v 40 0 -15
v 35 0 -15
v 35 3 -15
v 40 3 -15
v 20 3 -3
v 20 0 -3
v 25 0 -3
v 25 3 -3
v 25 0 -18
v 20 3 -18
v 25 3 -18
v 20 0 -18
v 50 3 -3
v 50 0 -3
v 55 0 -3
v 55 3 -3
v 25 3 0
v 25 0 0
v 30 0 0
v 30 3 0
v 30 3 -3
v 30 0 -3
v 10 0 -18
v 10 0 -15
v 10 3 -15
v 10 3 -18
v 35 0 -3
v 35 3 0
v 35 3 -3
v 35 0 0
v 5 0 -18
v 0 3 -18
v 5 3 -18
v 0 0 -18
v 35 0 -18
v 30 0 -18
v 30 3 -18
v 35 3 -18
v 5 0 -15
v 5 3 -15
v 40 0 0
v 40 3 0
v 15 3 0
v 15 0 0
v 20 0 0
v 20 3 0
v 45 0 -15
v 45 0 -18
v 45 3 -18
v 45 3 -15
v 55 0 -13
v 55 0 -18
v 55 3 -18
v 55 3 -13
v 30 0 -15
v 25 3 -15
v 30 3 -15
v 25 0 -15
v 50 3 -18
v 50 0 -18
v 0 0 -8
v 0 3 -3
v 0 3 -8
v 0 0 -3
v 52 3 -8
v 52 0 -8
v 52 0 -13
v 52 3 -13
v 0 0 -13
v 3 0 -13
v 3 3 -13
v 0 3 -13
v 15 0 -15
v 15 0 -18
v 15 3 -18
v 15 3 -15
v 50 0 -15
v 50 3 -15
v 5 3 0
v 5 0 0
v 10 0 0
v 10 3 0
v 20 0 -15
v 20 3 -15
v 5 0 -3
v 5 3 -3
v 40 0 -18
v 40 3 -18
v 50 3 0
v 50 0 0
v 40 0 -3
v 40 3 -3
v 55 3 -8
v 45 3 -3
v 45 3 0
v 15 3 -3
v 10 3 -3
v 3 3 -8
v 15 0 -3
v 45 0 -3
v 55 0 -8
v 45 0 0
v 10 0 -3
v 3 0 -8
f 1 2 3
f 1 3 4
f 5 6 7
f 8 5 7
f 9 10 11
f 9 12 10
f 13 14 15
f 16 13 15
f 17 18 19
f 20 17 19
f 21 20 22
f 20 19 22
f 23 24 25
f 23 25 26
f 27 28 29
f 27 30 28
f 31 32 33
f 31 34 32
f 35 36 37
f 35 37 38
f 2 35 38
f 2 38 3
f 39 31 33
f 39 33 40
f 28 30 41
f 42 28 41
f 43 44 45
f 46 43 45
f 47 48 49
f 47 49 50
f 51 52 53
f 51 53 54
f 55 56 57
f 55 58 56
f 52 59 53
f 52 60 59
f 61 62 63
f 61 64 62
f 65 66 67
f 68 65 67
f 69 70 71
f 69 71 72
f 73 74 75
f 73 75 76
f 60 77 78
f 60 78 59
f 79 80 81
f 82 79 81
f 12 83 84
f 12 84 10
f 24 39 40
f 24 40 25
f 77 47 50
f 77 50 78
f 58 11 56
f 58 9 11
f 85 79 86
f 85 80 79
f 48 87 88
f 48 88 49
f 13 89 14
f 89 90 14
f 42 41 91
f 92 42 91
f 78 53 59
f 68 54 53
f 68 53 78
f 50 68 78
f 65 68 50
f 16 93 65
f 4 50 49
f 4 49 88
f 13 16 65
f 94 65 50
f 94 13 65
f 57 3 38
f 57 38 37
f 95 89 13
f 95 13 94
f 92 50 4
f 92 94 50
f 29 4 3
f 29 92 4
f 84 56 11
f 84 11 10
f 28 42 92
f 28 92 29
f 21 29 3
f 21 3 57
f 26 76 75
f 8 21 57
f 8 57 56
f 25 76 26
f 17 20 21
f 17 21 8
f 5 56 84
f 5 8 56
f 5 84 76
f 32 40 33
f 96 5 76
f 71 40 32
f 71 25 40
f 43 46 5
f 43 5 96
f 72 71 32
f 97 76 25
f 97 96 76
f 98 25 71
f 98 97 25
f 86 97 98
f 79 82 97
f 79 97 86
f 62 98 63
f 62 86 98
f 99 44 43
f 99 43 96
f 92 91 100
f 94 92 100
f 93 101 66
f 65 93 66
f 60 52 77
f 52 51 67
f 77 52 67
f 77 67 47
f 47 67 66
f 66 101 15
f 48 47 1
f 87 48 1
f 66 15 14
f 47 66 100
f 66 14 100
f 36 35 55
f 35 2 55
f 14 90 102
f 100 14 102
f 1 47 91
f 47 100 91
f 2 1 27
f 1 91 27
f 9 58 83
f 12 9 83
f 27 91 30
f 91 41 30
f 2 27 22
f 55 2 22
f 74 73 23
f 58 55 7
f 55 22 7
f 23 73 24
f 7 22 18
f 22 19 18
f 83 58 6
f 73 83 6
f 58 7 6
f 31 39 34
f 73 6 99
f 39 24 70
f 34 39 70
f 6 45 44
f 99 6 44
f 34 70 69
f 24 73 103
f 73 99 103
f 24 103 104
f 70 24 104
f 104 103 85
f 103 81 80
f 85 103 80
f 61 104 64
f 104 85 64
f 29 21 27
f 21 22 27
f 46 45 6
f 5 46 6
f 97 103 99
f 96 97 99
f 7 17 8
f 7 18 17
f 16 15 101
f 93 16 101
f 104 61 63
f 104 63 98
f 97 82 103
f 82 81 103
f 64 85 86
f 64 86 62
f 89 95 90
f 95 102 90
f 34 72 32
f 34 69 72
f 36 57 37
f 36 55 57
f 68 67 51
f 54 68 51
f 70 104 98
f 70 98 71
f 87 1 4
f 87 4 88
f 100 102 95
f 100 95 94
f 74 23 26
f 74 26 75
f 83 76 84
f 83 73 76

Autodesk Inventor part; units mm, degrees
ref_plane "YZ Plane" through (0, 0, 0) normal (1, 0, 0) x (0, 1, 0)
ref_plane "XZ Plane" through (0, 0, 0) normal (0, 1, 0) x (-1, 0, 0)
ref_plane "XY Plane" through (0, 0, 0) normal (0, 0, 1) x (1, 0, 0)
sketch "Skizze1" plane through (0, 0, 0) normal (0, 1, 0) x (-1, 0, 0)
  line L0 (-5, 0) -> (-5, -3)
  line L1 (-5, -3) -> (0, -3)
  line L2 (-5, 0) -> (-10, 0)
  line L3 (-10, 0) -> (-10, -3)
  line L4 (-10, -3) -> (-15, -3)
  line L5 (-15, 0) -> (-15, -3)
  line L6 (-15, 0) -> (-20, 0)
  line L7 (-20, 0) -> (-20, -3)
  line L8 (-20, -3) -> (-25, -3)
  line L9 (-25, 0) -> (-25, -3)
  line L10 (-25, 0) -> (-30, 0)
  line L11 (-30, 0) -> (-30, -3)
  line L12 (-30, -3) -> (-35, -3)
  line L13 (-35, 0) -> (-35, -3)
  line L14 (-35, 0) -> (-40, 0)
  line L15 (-40, 0) -> (-40, -3)
  line L16 (-40, -3) -> (-45, -3)
  line L17 (-45, 0) -> (-45, -3)
  line L18 (-45, 0) -> (-50, 0)
  line L19 (-50, 0) -> (-50, -3)
  line L20 (-50, -3) -> (-55, -3)
  line L21 (-55, -3) -> (-55, -8)
  line L22 (-55, -8) -> (-52, -8)
  line L23 (-52, -8) -> (-52, -13)
  line L24 (-52, -13) -> (-55, -13)
  line L25 (0, -3) -> (0, -8)
  line L26 (0, -8) -> (-3, -8)
  line L27 (-3, -8) -> (-3, -13)
  line L28 (-3, -13) -> (0, -13)
  line L29 (0, -13) -> (0, -18)
  line L30 (-55, -18) -> (-55, -13)
  line L31 (0, -18) -> (-5, -18)
  line L32 (-5, -18) -> (-5, -15)
  line L33 (-5, -15) -> (-10, -15)
  line L34 (-10, -15) -> (-10, -18)
  line L35 (-20, -15) -> (-20, -18)
  line L36 (-15, -18) -> (-15, -15)
  line L37 (-10, -18) -> (-15, -18)
  line L38 (-15, -15) -> (-20, -15)
  line L39 (-30, -15) -> (-30, -18)
  line L40 (-25, -18) -> (-25, -15)
  line L41 (-20, -18) -> (-25, -18)
  line L42 (-25, -15) -> (-30, -15)
  line L43 (-40, -15) -> (-40, -18)
  line L44 (-35, -18) -> (-35, -15)
  line L45 (-30, -18) -> (-35, -18)
  line L46 (-35, -15) -> (-40, -15)
  line L47 (-50, -15) -> (-50, -18)
  line L48 (-45, -18) -> (-45, -15)
  line L49 (-40, -18) -> (-45, -18)
  line L50 (-45, -15) -> (-50, -15)
  line L51 (-50, -18) -> (-55, -18)
  point P0 (0, 0)
  dimension "d2" = 5
  dimension "d3" = 3
  dimension "d6" = 10
  dimension "d13" = 10
extrude "Extrusion1" add sketch "Skizze1" along normal blind 3
properties part number "plate_front_small" material "Holz (Kirsche)"
